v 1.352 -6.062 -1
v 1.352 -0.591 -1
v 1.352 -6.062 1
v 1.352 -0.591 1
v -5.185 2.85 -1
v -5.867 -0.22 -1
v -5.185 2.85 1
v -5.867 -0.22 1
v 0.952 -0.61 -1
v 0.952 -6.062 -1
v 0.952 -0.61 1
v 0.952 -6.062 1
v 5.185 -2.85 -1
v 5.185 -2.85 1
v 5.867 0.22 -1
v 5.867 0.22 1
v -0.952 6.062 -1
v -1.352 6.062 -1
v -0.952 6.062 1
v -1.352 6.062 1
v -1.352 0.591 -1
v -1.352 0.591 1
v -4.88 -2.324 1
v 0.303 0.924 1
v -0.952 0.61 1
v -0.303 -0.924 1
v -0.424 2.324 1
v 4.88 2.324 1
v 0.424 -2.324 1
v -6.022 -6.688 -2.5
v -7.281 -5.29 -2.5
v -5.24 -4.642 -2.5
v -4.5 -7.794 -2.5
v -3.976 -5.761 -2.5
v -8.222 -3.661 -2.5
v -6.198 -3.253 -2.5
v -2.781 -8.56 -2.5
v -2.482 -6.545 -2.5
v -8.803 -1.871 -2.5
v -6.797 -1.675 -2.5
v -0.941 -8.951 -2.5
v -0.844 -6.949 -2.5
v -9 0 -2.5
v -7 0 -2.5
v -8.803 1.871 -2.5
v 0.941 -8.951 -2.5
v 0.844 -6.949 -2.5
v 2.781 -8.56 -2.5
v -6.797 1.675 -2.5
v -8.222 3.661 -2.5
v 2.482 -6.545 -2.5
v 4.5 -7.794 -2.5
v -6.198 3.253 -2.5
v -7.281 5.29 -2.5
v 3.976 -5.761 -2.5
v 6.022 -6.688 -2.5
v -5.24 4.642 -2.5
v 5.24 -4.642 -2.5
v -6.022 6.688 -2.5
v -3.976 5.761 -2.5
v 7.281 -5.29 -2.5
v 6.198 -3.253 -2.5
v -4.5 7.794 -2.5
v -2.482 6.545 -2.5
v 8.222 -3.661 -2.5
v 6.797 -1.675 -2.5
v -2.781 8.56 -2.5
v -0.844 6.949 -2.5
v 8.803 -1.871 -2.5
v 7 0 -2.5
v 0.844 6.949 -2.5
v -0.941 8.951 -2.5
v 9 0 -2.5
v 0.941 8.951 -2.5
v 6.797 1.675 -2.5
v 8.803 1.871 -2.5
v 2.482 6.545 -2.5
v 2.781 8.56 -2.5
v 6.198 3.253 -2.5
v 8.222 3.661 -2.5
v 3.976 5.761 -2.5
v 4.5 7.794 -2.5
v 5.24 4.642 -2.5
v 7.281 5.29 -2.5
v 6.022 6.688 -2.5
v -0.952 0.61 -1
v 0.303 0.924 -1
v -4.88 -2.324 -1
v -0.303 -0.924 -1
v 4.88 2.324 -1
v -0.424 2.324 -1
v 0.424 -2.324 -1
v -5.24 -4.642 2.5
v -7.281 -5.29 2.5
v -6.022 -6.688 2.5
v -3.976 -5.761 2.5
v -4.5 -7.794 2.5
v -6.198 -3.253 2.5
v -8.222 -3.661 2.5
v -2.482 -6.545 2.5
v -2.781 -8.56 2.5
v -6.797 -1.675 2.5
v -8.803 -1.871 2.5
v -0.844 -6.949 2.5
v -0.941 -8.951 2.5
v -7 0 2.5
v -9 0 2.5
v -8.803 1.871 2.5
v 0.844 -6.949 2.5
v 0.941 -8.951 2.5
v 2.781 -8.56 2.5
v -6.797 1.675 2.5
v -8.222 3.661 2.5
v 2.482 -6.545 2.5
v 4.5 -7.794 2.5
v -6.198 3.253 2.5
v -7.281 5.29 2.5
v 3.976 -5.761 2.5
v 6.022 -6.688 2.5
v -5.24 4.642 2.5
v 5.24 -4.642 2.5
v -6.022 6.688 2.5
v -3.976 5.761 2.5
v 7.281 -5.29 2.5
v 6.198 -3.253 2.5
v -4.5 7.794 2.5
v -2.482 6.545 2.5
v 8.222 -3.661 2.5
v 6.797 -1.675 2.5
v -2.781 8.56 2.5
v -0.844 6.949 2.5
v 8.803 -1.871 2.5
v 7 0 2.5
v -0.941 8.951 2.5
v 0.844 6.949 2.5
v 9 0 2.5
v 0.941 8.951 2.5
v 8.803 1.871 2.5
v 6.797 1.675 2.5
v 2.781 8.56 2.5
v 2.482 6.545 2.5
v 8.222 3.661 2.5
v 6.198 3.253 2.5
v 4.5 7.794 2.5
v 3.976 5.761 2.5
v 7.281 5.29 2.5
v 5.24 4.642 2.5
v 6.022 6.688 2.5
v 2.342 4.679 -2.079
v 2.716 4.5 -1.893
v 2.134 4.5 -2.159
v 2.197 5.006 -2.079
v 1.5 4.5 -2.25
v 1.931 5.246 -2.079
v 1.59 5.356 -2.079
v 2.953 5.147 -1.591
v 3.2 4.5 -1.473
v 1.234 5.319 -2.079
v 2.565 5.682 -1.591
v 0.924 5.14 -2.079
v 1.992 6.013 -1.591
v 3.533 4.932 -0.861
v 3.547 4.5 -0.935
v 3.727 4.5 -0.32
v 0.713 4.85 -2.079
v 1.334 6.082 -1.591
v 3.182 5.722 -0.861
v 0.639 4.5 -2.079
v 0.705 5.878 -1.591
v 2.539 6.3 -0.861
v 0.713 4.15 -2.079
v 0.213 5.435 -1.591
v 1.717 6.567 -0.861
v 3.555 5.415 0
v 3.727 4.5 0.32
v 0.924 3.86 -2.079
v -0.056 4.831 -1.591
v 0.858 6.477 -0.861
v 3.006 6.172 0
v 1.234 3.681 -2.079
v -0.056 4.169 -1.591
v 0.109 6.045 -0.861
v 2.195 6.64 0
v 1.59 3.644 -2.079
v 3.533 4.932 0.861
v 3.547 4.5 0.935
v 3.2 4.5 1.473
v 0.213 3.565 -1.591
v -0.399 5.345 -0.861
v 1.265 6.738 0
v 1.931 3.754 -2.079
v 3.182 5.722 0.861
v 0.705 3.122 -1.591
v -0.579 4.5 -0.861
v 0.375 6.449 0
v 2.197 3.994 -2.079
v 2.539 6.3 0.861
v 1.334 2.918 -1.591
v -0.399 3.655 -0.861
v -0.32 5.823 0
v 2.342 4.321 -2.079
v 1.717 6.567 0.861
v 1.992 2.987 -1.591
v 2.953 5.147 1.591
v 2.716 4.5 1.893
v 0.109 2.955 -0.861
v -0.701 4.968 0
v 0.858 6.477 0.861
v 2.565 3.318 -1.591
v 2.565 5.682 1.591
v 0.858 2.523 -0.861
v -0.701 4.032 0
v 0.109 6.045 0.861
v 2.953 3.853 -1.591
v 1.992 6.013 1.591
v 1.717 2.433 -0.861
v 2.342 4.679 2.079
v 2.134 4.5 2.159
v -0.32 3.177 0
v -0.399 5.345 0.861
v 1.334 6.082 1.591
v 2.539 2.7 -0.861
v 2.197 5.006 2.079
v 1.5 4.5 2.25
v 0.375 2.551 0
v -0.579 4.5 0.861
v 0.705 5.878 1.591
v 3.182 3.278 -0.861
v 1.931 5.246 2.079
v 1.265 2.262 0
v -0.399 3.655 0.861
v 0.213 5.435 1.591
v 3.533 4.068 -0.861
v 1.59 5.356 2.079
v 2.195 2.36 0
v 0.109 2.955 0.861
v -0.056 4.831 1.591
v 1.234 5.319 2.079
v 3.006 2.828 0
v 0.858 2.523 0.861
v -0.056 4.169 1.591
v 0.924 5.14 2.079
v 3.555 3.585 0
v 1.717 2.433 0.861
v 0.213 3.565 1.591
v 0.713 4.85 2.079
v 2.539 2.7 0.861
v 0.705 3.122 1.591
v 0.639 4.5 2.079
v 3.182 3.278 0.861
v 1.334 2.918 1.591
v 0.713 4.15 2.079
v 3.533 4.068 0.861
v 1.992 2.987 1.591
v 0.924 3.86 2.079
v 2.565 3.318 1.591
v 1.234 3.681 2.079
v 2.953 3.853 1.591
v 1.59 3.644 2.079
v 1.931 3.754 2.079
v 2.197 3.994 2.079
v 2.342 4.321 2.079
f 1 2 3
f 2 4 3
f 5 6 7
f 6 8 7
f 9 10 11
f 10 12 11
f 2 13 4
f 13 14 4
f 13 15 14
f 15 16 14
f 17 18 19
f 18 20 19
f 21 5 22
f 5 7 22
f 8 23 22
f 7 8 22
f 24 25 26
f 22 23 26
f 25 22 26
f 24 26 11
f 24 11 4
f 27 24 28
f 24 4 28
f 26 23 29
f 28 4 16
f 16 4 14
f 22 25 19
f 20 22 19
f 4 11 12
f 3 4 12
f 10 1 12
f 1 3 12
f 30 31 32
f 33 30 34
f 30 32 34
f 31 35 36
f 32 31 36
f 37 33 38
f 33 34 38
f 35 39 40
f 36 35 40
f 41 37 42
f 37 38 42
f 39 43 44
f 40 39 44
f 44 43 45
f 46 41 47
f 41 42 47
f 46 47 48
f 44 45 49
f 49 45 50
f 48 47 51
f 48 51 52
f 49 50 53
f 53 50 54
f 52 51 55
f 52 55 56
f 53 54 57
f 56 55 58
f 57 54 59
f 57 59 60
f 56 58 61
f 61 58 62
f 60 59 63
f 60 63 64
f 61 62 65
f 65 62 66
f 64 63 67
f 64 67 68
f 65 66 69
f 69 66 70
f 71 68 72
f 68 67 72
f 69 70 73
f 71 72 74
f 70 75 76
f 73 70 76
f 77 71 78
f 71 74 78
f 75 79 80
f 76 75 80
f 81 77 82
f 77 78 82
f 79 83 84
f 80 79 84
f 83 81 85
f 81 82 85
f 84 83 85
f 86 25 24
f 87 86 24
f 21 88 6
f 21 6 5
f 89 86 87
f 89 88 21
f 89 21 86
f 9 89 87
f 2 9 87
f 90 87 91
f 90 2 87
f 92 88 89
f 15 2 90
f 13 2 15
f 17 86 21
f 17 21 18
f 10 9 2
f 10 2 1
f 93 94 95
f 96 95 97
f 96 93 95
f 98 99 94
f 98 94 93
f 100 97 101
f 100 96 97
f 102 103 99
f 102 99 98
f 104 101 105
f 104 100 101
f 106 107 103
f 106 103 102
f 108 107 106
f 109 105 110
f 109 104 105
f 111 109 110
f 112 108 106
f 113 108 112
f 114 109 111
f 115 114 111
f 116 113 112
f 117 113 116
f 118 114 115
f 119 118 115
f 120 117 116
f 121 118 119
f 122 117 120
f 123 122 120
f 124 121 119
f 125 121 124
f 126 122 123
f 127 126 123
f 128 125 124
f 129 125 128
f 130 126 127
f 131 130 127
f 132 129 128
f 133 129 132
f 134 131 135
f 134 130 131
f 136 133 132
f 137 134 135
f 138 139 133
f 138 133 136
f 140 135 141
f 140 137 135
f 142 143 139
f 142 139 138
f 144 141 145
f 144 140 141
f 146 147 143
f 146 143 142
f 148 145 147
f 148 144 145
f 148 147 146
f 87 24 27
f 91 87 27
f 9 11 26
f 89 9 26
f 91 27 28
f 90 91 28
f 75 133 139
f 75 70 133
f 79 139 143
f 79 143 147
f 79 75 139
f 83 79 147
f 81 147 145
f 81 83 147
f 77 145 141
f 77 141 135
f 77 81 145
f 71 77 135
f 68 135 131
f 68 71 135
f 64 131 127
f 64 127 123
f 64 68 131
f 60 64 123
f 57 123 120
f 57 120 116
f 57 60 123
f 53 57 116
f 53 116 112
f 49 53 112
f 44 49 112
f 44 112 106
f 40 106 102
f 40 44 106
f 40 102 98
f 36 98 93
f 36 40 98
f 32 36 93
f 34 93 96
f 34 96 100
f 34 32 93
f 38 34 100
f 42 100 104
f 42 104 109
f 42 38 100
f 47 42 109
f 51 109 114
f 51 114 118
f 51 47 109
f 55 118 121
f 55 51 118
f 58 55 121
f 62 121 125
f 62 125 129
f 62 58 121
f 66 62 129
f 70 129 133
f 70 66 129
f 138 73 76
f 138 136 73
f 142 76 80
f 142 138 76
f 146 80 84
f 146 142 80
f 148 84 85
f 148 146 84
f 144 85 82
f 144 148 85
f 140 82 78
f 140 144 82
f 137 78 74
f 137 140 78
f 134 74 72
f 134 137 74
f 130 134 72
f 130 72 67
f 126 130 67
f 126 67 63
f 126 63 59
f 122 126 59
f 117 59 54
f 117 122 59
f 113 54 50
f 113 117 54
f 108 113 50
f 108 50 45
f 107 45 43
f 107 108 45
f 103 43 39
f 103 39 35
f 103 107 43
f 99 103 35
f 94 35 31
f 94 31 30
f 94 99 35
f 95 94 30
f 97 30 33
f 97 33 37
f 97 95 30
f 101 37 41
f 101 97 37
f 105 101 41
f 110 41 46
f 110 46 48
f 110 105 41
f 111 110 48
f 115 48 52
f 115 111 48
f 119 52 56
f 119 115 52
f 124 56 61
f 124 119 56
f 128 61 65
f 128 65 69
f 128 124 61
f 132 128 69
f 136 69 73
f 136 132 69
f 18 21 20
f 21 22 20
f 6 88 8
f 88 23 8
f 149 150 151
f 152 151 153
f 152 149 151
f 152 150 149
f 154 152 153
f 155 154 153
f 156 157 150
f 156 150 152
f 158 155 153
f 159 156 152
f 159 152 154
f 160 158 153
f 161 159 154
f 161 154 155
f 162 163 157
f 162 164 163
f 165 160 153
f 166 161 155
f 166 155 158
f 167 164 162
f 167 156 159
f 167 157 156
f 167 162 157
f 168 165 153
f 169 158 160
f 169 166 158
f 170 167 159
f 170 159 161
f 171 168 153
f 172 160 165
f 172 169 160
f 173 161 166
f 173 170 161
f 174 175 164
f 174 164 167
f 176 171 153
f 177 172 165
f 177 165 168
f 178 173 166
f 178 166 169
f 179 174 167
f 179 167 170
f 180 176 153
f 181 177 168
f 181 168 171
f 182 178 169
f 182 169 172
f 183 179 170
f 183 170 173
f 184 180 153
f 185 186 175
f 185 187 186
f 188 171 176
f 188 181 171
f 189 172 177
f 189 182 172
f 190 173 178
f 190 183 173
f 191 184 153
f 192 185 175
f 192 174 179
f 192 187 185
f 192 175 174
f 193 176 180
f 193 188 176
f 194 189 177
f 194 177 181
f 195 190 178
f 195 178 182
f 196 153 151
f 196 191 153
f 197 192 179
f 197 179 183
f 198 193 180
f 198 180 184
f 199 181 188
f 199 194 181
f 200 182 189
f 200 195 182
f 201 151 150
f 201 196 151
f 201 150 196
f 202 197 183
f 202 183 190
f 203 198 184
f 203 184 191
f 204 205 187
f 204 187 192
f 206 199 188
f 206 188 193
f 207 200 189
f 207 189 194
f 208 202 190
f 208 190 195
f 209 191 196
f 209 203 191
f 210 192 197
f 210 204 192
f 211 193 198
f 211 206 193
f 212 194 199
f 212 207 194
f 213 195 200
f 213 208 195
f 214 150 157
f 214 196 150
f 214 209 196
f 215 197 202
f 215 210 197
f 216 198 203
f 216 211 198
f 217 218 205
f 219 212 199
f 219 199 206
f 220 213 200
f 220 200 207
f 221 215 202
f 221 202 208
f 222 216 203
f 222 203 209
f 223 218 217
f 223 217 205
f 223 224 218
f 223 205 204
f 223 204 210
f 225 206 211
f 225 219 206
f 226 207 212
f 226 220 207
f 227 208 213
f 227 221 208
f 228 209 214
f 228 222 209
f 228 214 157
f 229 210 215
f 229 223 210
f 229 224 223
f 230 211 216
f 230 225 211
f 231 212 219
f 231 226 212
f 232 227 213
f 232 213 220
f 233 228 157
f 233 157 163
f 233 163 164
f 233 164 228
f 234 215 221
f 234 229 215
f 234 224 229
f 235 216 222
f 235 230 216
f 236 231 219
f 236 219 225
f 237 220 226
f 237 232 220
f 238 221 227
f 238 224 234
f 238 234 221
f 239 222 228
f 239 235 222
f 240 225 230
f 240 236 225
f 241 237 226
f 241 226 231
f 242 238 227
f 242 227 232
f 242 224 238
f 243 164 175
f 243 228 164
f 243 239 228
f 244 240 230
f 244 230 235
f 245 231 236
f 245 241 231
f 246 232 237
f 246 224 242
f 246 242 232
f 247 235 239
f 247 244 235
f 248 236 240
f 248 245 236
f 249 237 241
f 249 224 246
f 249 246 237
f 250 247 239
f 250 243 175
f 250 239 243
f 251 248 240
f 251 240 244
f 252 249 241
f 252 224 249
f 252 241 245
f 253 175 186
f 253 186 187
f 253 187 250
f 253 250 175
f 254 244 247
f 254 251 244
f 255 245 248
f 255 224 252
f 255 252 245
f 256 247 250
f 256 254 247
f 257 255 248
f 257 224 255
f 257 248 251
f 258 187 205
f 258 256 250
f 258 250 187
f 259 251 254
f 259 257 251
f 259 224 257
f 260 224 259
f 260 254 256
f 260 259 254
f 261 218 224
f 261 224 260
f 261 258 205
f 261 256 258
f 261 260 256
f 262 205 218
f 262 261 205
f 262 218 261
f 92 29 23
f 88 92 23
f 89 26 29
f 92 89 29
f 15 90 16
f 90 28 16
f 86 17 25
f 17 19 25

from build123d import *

# Parameters (mm, degrees)
SKETCH003_R        = 9
SKETCH003_R_2      = 7
PAD001_DEPTH       = 2.5
PAD_DEPTH          = 1
POLARPATTERN_COUNT = 2


with BuildPart() as pad001:
    # Sketch003 → Pad001 (new body, symmetric)
    with BuildSketch(Plane.XY):
        Circle(SKETCH003_R)
        Circle(SKETCH003_R_2, mode=Mode.SUBTRACT)
    extrude(amount=PAD001_DEPTH, both=True)


with BuildPart() as polarpattern:
    # Sketch002 → Pad (new body, symmetric)
    with BuildSketch(Plane.XY):
        Polygon((-0.424066, 2.324241), (4.880309, 2.324241), (5.867286, 0.220209), (0, 0), (-5.867286, -0.220209), (-5.185044, 2.849646), (-1.352089, 0.590664), (-1.352089, 6.062253), (-0.952089, 6.062253), (-0.952089, 0.609972), (0.302905, 0.923859), align=None)
    pad = extrude(amount=PAD_DEPTH, both=True)

    # PolarPattern: Pad ×2 about axis
    polarpattern_axis = Axis((0, 0, 0), (0, 0, 1))
    for i in range(1, POLARPATTERN_COUNT):
        add(pad.rotate(polarpattern_axis, i * 360 / POLARPATTERN_COUNT))


with BuildPart() as sphere:
    # Sphere → Sphere (revolve)
    with BuildSketch(Plane(origin=(1.5, 4.5, 0), x_dir=(1, 0, 0), z_dir=(0, -1, 0))):
        with BuildLine():
            ThreePointArc((0, -2.25), (2.25, 0), (0, 2.25))
            Line((0, 2.25), (0, -2.25))
        make_face()
    revolve(axis=Axis((1.5, 4.5, 0), (0, 0, 1)))


solid = Compound([pad001.part, polarpattern.part, sphere.part])
